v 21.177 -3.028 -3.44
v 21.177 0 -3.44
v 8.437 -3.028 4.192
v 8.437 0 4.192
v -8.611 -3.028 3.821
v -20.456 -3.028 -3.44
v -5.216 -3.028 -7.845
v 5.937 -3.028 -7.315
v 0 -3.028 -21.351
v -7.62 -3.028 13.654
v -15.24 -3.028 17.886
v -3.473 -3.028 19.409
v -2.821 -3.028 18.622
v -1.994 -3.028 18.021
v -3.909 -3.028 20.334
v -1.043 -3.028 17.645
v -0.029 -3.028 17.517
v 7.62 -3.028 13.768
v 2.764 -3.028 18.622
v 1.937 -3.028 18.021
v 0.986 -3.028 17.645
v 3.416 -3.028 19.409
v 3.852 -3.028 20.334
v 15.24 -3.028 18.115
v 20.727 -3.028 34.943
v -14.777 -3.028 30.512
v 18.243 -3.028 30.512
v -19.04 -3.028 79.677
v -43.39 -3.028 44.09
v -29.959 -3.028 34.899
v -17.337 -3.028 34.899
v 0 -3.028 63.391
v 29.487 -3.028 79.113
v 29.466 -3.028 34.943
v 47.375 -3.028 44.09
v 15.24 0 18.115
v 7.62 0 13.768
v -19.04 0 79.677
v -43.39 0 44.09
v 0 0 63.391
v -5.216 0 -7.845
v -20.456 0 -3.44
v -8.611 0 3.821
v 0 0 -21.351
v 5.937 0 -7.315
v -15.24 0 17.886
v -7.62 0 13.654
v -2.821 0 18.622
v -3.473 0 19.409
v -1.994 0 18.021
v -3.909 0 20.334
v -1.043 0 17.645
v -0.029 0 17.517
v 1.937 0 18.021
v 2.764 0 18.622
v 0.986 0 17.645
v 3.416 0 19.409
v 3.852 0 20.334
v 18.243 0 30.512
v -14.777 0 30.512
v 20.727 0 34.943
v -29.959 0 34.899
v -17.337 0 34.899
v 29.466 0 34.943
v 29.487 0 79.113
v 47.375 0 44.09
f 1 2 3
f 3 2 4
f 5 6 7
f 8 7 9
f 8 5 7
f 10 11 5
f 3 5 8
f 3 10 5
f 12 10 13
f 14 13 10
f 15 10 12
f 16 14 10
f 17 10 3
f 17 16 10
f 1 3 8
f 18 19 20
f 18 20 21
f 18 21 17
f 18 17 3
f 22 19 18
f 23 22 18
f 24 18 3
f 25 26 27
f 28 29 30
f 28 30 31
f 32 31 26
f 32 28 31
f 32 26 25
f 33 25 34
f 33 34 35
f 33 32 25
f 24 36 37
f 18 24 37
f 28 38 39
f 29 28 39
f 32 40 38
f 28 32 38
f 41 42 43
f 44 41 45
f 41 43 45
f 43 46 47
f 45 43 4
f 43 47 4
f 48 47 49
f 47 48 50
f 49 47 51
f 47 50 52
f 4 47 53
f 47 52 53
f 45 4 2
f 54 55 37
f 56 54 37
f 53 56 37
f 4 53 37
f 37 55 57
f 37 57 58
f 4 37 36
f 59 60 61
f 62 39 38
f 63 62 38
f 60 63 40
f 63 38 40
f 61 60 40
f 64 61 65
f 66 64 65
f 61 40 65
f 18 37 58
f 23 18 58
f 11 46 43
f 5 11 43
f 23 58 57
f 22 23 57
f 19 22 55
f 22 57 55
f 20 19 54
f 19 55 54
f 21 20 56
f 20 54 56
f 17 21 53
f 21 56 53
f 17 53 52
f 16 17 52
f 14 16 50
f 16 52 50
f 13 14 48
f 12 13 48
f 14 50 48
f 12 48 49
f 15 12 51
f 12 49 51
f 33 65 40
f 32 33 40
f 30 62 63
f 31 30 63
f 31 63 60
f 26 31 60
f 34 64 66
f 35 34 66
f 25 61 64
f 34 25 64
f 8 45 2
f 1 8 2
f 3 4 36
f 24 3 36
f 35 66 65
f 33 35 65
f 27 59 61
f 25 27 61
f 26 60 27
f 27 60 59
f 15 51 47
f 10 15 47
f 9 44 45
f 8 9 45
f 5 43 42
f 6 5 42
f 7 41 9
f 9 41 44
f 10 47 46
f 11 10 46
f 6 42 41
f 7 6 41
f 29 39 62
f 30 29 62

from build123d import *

# Parameters (mm, degrees)
F0_R     = 8.829839
F1_DEPTH = 3.02768


with BuildPart() as f1:
    # F0 (on Front) → F1 (new body)
    with BuildSketch(Plane.XZ):
        Polygon((-14.776537, 30.511623), (-9.45221, 30.511623), (18.243463, 30.511623), (20.726544, 34.943407), (23.209625, 39.375191), (23.209625, 54.615191), (18.089482, 63.390711), (0, 63.390711), (-14.930518, 63.390711), (-19.896679, 54.527142), (-19.896679, 39.287142), (-17.336608, 34.899383), align=None)
        with BuildLine():
            Line((-20.45646, -3.439647), (-5.21646, -7.844945))
            ThreePointArc((-5.21646, -7.844945), (-9.045748, -2.632311), (-8.611271, 3.821078))
            Line((-8.611271, 3.821078), (-20.45646, -3.439647))
        make_face()
        with BuildLine():
            Line((0, -21.350686), (5.937121, -7.314725))
            ThreePointArc((5.937121, -7.314725), (0.447349, -9.41034), (-5.21646, -7.844945))
            Line((-5.21646, -7.844945), (0, -21.350686))
        make_face()
        with BuildLine():
            ThreePointArc((8.437115, 4.191624), (9.171706, 2.15277), (9.420967, 0))
            ThreePointArc((9.420967, 0), (8.505529, -4.051), (5.937121, -7.314725))
            Line((5.937121, -7.314725), (21.177121, -3.439647))
            Line((21.177121, -3.439647), (8.437115, 4.191624))
        make_face()
        Polygon((23.209625, 39.375191), (20.726544, 34.943407), (29.465981, 34.943407), (47.374807, 44.090033), (29.487289, 79.113273), (0, 63.390711), (18.089482, 63.390711), (23.209625, 54.615191), align=None)
        Polygon((-29.958768, 34.899383), (-17.336608, 34.899383), (-19.896679, 39.287142), (-19.896679, 54.527142), (-14.930518, 63.390711), (0, 63.390711), (-19.039609, 79.677324), (-43.390386, 44.090033), align=None)
        with BuildLine():
            ThreePointArc((0, 9.420967), (4.963137, 8.007614), (8.437115, 4.191624))
            Line((8.437115, 4.191624), (15.24, 18.115476))
            Line((15.24, 18.115476), (7.62, 13.768222))
            Line((7.62, 13.768222), (0, 9.420967))
        make_face()
        with BuildLine():
            ThreePointArc((-8.611271, 3.821078), (-5.13597, 7.897875), (0, 9.420967))
            Line((0, 9.420967), (-7.62, 13.653567))
            Line((-7.62, 13.653567), (-15.24, 17.886167))
            Line((-15.24, 17.886167), (-8.611271, 3.821078))
        make_face()
        with BuildLine():
            Line((-7.62, 13.653567), (0, 9.420967))
            Line((0, 9.420967), (7.62, 13.768222))
            Line((7.62, 13.768222), (3.852159, 20.333877))
            ThreePointArc((3.852159, 20.333877), (2.369176, 18.295184), (-0.0286, 17.516605))
            ThreePointArc((-0.0286, 17.516605), (-2.426376, 18.295184), (-3.909359, 20.333877))
            Line((-3.909359, 20.333877), (-7.62, 13.653567))
        make_face()
        with BuildLine():
            ThreePointArc((5.937121, -7.314725), (8.505529, -4.051), (9.420967, 0))
            ThreePointArc((9.420967, 0), (9.171706, 2.15277), (8.437115, 4.191624))
            ThreePointArc((8.437115, 4.191624), (4.963137, 8.007614), (0, 9.420967))
            ThreePointArc((0, 9.420967), (-5.13597, 7.897875), (-8.611271, 3.821078))
            ThreePointArc((-8.611271, 3.821078), (-9.045748, -2.632311), (-5.21646, -7.844945))
            ThreePointArc((-5.21646, -7.844945), (0.447349, -9.41034), (5.937121, -7.314725))
        make_face()
        Circle(F0_R, mode=Mode.SUBTRACT)
        Circle(F0_R)
    extrude(amount=F1_DEPTH)


solid = f1.part
